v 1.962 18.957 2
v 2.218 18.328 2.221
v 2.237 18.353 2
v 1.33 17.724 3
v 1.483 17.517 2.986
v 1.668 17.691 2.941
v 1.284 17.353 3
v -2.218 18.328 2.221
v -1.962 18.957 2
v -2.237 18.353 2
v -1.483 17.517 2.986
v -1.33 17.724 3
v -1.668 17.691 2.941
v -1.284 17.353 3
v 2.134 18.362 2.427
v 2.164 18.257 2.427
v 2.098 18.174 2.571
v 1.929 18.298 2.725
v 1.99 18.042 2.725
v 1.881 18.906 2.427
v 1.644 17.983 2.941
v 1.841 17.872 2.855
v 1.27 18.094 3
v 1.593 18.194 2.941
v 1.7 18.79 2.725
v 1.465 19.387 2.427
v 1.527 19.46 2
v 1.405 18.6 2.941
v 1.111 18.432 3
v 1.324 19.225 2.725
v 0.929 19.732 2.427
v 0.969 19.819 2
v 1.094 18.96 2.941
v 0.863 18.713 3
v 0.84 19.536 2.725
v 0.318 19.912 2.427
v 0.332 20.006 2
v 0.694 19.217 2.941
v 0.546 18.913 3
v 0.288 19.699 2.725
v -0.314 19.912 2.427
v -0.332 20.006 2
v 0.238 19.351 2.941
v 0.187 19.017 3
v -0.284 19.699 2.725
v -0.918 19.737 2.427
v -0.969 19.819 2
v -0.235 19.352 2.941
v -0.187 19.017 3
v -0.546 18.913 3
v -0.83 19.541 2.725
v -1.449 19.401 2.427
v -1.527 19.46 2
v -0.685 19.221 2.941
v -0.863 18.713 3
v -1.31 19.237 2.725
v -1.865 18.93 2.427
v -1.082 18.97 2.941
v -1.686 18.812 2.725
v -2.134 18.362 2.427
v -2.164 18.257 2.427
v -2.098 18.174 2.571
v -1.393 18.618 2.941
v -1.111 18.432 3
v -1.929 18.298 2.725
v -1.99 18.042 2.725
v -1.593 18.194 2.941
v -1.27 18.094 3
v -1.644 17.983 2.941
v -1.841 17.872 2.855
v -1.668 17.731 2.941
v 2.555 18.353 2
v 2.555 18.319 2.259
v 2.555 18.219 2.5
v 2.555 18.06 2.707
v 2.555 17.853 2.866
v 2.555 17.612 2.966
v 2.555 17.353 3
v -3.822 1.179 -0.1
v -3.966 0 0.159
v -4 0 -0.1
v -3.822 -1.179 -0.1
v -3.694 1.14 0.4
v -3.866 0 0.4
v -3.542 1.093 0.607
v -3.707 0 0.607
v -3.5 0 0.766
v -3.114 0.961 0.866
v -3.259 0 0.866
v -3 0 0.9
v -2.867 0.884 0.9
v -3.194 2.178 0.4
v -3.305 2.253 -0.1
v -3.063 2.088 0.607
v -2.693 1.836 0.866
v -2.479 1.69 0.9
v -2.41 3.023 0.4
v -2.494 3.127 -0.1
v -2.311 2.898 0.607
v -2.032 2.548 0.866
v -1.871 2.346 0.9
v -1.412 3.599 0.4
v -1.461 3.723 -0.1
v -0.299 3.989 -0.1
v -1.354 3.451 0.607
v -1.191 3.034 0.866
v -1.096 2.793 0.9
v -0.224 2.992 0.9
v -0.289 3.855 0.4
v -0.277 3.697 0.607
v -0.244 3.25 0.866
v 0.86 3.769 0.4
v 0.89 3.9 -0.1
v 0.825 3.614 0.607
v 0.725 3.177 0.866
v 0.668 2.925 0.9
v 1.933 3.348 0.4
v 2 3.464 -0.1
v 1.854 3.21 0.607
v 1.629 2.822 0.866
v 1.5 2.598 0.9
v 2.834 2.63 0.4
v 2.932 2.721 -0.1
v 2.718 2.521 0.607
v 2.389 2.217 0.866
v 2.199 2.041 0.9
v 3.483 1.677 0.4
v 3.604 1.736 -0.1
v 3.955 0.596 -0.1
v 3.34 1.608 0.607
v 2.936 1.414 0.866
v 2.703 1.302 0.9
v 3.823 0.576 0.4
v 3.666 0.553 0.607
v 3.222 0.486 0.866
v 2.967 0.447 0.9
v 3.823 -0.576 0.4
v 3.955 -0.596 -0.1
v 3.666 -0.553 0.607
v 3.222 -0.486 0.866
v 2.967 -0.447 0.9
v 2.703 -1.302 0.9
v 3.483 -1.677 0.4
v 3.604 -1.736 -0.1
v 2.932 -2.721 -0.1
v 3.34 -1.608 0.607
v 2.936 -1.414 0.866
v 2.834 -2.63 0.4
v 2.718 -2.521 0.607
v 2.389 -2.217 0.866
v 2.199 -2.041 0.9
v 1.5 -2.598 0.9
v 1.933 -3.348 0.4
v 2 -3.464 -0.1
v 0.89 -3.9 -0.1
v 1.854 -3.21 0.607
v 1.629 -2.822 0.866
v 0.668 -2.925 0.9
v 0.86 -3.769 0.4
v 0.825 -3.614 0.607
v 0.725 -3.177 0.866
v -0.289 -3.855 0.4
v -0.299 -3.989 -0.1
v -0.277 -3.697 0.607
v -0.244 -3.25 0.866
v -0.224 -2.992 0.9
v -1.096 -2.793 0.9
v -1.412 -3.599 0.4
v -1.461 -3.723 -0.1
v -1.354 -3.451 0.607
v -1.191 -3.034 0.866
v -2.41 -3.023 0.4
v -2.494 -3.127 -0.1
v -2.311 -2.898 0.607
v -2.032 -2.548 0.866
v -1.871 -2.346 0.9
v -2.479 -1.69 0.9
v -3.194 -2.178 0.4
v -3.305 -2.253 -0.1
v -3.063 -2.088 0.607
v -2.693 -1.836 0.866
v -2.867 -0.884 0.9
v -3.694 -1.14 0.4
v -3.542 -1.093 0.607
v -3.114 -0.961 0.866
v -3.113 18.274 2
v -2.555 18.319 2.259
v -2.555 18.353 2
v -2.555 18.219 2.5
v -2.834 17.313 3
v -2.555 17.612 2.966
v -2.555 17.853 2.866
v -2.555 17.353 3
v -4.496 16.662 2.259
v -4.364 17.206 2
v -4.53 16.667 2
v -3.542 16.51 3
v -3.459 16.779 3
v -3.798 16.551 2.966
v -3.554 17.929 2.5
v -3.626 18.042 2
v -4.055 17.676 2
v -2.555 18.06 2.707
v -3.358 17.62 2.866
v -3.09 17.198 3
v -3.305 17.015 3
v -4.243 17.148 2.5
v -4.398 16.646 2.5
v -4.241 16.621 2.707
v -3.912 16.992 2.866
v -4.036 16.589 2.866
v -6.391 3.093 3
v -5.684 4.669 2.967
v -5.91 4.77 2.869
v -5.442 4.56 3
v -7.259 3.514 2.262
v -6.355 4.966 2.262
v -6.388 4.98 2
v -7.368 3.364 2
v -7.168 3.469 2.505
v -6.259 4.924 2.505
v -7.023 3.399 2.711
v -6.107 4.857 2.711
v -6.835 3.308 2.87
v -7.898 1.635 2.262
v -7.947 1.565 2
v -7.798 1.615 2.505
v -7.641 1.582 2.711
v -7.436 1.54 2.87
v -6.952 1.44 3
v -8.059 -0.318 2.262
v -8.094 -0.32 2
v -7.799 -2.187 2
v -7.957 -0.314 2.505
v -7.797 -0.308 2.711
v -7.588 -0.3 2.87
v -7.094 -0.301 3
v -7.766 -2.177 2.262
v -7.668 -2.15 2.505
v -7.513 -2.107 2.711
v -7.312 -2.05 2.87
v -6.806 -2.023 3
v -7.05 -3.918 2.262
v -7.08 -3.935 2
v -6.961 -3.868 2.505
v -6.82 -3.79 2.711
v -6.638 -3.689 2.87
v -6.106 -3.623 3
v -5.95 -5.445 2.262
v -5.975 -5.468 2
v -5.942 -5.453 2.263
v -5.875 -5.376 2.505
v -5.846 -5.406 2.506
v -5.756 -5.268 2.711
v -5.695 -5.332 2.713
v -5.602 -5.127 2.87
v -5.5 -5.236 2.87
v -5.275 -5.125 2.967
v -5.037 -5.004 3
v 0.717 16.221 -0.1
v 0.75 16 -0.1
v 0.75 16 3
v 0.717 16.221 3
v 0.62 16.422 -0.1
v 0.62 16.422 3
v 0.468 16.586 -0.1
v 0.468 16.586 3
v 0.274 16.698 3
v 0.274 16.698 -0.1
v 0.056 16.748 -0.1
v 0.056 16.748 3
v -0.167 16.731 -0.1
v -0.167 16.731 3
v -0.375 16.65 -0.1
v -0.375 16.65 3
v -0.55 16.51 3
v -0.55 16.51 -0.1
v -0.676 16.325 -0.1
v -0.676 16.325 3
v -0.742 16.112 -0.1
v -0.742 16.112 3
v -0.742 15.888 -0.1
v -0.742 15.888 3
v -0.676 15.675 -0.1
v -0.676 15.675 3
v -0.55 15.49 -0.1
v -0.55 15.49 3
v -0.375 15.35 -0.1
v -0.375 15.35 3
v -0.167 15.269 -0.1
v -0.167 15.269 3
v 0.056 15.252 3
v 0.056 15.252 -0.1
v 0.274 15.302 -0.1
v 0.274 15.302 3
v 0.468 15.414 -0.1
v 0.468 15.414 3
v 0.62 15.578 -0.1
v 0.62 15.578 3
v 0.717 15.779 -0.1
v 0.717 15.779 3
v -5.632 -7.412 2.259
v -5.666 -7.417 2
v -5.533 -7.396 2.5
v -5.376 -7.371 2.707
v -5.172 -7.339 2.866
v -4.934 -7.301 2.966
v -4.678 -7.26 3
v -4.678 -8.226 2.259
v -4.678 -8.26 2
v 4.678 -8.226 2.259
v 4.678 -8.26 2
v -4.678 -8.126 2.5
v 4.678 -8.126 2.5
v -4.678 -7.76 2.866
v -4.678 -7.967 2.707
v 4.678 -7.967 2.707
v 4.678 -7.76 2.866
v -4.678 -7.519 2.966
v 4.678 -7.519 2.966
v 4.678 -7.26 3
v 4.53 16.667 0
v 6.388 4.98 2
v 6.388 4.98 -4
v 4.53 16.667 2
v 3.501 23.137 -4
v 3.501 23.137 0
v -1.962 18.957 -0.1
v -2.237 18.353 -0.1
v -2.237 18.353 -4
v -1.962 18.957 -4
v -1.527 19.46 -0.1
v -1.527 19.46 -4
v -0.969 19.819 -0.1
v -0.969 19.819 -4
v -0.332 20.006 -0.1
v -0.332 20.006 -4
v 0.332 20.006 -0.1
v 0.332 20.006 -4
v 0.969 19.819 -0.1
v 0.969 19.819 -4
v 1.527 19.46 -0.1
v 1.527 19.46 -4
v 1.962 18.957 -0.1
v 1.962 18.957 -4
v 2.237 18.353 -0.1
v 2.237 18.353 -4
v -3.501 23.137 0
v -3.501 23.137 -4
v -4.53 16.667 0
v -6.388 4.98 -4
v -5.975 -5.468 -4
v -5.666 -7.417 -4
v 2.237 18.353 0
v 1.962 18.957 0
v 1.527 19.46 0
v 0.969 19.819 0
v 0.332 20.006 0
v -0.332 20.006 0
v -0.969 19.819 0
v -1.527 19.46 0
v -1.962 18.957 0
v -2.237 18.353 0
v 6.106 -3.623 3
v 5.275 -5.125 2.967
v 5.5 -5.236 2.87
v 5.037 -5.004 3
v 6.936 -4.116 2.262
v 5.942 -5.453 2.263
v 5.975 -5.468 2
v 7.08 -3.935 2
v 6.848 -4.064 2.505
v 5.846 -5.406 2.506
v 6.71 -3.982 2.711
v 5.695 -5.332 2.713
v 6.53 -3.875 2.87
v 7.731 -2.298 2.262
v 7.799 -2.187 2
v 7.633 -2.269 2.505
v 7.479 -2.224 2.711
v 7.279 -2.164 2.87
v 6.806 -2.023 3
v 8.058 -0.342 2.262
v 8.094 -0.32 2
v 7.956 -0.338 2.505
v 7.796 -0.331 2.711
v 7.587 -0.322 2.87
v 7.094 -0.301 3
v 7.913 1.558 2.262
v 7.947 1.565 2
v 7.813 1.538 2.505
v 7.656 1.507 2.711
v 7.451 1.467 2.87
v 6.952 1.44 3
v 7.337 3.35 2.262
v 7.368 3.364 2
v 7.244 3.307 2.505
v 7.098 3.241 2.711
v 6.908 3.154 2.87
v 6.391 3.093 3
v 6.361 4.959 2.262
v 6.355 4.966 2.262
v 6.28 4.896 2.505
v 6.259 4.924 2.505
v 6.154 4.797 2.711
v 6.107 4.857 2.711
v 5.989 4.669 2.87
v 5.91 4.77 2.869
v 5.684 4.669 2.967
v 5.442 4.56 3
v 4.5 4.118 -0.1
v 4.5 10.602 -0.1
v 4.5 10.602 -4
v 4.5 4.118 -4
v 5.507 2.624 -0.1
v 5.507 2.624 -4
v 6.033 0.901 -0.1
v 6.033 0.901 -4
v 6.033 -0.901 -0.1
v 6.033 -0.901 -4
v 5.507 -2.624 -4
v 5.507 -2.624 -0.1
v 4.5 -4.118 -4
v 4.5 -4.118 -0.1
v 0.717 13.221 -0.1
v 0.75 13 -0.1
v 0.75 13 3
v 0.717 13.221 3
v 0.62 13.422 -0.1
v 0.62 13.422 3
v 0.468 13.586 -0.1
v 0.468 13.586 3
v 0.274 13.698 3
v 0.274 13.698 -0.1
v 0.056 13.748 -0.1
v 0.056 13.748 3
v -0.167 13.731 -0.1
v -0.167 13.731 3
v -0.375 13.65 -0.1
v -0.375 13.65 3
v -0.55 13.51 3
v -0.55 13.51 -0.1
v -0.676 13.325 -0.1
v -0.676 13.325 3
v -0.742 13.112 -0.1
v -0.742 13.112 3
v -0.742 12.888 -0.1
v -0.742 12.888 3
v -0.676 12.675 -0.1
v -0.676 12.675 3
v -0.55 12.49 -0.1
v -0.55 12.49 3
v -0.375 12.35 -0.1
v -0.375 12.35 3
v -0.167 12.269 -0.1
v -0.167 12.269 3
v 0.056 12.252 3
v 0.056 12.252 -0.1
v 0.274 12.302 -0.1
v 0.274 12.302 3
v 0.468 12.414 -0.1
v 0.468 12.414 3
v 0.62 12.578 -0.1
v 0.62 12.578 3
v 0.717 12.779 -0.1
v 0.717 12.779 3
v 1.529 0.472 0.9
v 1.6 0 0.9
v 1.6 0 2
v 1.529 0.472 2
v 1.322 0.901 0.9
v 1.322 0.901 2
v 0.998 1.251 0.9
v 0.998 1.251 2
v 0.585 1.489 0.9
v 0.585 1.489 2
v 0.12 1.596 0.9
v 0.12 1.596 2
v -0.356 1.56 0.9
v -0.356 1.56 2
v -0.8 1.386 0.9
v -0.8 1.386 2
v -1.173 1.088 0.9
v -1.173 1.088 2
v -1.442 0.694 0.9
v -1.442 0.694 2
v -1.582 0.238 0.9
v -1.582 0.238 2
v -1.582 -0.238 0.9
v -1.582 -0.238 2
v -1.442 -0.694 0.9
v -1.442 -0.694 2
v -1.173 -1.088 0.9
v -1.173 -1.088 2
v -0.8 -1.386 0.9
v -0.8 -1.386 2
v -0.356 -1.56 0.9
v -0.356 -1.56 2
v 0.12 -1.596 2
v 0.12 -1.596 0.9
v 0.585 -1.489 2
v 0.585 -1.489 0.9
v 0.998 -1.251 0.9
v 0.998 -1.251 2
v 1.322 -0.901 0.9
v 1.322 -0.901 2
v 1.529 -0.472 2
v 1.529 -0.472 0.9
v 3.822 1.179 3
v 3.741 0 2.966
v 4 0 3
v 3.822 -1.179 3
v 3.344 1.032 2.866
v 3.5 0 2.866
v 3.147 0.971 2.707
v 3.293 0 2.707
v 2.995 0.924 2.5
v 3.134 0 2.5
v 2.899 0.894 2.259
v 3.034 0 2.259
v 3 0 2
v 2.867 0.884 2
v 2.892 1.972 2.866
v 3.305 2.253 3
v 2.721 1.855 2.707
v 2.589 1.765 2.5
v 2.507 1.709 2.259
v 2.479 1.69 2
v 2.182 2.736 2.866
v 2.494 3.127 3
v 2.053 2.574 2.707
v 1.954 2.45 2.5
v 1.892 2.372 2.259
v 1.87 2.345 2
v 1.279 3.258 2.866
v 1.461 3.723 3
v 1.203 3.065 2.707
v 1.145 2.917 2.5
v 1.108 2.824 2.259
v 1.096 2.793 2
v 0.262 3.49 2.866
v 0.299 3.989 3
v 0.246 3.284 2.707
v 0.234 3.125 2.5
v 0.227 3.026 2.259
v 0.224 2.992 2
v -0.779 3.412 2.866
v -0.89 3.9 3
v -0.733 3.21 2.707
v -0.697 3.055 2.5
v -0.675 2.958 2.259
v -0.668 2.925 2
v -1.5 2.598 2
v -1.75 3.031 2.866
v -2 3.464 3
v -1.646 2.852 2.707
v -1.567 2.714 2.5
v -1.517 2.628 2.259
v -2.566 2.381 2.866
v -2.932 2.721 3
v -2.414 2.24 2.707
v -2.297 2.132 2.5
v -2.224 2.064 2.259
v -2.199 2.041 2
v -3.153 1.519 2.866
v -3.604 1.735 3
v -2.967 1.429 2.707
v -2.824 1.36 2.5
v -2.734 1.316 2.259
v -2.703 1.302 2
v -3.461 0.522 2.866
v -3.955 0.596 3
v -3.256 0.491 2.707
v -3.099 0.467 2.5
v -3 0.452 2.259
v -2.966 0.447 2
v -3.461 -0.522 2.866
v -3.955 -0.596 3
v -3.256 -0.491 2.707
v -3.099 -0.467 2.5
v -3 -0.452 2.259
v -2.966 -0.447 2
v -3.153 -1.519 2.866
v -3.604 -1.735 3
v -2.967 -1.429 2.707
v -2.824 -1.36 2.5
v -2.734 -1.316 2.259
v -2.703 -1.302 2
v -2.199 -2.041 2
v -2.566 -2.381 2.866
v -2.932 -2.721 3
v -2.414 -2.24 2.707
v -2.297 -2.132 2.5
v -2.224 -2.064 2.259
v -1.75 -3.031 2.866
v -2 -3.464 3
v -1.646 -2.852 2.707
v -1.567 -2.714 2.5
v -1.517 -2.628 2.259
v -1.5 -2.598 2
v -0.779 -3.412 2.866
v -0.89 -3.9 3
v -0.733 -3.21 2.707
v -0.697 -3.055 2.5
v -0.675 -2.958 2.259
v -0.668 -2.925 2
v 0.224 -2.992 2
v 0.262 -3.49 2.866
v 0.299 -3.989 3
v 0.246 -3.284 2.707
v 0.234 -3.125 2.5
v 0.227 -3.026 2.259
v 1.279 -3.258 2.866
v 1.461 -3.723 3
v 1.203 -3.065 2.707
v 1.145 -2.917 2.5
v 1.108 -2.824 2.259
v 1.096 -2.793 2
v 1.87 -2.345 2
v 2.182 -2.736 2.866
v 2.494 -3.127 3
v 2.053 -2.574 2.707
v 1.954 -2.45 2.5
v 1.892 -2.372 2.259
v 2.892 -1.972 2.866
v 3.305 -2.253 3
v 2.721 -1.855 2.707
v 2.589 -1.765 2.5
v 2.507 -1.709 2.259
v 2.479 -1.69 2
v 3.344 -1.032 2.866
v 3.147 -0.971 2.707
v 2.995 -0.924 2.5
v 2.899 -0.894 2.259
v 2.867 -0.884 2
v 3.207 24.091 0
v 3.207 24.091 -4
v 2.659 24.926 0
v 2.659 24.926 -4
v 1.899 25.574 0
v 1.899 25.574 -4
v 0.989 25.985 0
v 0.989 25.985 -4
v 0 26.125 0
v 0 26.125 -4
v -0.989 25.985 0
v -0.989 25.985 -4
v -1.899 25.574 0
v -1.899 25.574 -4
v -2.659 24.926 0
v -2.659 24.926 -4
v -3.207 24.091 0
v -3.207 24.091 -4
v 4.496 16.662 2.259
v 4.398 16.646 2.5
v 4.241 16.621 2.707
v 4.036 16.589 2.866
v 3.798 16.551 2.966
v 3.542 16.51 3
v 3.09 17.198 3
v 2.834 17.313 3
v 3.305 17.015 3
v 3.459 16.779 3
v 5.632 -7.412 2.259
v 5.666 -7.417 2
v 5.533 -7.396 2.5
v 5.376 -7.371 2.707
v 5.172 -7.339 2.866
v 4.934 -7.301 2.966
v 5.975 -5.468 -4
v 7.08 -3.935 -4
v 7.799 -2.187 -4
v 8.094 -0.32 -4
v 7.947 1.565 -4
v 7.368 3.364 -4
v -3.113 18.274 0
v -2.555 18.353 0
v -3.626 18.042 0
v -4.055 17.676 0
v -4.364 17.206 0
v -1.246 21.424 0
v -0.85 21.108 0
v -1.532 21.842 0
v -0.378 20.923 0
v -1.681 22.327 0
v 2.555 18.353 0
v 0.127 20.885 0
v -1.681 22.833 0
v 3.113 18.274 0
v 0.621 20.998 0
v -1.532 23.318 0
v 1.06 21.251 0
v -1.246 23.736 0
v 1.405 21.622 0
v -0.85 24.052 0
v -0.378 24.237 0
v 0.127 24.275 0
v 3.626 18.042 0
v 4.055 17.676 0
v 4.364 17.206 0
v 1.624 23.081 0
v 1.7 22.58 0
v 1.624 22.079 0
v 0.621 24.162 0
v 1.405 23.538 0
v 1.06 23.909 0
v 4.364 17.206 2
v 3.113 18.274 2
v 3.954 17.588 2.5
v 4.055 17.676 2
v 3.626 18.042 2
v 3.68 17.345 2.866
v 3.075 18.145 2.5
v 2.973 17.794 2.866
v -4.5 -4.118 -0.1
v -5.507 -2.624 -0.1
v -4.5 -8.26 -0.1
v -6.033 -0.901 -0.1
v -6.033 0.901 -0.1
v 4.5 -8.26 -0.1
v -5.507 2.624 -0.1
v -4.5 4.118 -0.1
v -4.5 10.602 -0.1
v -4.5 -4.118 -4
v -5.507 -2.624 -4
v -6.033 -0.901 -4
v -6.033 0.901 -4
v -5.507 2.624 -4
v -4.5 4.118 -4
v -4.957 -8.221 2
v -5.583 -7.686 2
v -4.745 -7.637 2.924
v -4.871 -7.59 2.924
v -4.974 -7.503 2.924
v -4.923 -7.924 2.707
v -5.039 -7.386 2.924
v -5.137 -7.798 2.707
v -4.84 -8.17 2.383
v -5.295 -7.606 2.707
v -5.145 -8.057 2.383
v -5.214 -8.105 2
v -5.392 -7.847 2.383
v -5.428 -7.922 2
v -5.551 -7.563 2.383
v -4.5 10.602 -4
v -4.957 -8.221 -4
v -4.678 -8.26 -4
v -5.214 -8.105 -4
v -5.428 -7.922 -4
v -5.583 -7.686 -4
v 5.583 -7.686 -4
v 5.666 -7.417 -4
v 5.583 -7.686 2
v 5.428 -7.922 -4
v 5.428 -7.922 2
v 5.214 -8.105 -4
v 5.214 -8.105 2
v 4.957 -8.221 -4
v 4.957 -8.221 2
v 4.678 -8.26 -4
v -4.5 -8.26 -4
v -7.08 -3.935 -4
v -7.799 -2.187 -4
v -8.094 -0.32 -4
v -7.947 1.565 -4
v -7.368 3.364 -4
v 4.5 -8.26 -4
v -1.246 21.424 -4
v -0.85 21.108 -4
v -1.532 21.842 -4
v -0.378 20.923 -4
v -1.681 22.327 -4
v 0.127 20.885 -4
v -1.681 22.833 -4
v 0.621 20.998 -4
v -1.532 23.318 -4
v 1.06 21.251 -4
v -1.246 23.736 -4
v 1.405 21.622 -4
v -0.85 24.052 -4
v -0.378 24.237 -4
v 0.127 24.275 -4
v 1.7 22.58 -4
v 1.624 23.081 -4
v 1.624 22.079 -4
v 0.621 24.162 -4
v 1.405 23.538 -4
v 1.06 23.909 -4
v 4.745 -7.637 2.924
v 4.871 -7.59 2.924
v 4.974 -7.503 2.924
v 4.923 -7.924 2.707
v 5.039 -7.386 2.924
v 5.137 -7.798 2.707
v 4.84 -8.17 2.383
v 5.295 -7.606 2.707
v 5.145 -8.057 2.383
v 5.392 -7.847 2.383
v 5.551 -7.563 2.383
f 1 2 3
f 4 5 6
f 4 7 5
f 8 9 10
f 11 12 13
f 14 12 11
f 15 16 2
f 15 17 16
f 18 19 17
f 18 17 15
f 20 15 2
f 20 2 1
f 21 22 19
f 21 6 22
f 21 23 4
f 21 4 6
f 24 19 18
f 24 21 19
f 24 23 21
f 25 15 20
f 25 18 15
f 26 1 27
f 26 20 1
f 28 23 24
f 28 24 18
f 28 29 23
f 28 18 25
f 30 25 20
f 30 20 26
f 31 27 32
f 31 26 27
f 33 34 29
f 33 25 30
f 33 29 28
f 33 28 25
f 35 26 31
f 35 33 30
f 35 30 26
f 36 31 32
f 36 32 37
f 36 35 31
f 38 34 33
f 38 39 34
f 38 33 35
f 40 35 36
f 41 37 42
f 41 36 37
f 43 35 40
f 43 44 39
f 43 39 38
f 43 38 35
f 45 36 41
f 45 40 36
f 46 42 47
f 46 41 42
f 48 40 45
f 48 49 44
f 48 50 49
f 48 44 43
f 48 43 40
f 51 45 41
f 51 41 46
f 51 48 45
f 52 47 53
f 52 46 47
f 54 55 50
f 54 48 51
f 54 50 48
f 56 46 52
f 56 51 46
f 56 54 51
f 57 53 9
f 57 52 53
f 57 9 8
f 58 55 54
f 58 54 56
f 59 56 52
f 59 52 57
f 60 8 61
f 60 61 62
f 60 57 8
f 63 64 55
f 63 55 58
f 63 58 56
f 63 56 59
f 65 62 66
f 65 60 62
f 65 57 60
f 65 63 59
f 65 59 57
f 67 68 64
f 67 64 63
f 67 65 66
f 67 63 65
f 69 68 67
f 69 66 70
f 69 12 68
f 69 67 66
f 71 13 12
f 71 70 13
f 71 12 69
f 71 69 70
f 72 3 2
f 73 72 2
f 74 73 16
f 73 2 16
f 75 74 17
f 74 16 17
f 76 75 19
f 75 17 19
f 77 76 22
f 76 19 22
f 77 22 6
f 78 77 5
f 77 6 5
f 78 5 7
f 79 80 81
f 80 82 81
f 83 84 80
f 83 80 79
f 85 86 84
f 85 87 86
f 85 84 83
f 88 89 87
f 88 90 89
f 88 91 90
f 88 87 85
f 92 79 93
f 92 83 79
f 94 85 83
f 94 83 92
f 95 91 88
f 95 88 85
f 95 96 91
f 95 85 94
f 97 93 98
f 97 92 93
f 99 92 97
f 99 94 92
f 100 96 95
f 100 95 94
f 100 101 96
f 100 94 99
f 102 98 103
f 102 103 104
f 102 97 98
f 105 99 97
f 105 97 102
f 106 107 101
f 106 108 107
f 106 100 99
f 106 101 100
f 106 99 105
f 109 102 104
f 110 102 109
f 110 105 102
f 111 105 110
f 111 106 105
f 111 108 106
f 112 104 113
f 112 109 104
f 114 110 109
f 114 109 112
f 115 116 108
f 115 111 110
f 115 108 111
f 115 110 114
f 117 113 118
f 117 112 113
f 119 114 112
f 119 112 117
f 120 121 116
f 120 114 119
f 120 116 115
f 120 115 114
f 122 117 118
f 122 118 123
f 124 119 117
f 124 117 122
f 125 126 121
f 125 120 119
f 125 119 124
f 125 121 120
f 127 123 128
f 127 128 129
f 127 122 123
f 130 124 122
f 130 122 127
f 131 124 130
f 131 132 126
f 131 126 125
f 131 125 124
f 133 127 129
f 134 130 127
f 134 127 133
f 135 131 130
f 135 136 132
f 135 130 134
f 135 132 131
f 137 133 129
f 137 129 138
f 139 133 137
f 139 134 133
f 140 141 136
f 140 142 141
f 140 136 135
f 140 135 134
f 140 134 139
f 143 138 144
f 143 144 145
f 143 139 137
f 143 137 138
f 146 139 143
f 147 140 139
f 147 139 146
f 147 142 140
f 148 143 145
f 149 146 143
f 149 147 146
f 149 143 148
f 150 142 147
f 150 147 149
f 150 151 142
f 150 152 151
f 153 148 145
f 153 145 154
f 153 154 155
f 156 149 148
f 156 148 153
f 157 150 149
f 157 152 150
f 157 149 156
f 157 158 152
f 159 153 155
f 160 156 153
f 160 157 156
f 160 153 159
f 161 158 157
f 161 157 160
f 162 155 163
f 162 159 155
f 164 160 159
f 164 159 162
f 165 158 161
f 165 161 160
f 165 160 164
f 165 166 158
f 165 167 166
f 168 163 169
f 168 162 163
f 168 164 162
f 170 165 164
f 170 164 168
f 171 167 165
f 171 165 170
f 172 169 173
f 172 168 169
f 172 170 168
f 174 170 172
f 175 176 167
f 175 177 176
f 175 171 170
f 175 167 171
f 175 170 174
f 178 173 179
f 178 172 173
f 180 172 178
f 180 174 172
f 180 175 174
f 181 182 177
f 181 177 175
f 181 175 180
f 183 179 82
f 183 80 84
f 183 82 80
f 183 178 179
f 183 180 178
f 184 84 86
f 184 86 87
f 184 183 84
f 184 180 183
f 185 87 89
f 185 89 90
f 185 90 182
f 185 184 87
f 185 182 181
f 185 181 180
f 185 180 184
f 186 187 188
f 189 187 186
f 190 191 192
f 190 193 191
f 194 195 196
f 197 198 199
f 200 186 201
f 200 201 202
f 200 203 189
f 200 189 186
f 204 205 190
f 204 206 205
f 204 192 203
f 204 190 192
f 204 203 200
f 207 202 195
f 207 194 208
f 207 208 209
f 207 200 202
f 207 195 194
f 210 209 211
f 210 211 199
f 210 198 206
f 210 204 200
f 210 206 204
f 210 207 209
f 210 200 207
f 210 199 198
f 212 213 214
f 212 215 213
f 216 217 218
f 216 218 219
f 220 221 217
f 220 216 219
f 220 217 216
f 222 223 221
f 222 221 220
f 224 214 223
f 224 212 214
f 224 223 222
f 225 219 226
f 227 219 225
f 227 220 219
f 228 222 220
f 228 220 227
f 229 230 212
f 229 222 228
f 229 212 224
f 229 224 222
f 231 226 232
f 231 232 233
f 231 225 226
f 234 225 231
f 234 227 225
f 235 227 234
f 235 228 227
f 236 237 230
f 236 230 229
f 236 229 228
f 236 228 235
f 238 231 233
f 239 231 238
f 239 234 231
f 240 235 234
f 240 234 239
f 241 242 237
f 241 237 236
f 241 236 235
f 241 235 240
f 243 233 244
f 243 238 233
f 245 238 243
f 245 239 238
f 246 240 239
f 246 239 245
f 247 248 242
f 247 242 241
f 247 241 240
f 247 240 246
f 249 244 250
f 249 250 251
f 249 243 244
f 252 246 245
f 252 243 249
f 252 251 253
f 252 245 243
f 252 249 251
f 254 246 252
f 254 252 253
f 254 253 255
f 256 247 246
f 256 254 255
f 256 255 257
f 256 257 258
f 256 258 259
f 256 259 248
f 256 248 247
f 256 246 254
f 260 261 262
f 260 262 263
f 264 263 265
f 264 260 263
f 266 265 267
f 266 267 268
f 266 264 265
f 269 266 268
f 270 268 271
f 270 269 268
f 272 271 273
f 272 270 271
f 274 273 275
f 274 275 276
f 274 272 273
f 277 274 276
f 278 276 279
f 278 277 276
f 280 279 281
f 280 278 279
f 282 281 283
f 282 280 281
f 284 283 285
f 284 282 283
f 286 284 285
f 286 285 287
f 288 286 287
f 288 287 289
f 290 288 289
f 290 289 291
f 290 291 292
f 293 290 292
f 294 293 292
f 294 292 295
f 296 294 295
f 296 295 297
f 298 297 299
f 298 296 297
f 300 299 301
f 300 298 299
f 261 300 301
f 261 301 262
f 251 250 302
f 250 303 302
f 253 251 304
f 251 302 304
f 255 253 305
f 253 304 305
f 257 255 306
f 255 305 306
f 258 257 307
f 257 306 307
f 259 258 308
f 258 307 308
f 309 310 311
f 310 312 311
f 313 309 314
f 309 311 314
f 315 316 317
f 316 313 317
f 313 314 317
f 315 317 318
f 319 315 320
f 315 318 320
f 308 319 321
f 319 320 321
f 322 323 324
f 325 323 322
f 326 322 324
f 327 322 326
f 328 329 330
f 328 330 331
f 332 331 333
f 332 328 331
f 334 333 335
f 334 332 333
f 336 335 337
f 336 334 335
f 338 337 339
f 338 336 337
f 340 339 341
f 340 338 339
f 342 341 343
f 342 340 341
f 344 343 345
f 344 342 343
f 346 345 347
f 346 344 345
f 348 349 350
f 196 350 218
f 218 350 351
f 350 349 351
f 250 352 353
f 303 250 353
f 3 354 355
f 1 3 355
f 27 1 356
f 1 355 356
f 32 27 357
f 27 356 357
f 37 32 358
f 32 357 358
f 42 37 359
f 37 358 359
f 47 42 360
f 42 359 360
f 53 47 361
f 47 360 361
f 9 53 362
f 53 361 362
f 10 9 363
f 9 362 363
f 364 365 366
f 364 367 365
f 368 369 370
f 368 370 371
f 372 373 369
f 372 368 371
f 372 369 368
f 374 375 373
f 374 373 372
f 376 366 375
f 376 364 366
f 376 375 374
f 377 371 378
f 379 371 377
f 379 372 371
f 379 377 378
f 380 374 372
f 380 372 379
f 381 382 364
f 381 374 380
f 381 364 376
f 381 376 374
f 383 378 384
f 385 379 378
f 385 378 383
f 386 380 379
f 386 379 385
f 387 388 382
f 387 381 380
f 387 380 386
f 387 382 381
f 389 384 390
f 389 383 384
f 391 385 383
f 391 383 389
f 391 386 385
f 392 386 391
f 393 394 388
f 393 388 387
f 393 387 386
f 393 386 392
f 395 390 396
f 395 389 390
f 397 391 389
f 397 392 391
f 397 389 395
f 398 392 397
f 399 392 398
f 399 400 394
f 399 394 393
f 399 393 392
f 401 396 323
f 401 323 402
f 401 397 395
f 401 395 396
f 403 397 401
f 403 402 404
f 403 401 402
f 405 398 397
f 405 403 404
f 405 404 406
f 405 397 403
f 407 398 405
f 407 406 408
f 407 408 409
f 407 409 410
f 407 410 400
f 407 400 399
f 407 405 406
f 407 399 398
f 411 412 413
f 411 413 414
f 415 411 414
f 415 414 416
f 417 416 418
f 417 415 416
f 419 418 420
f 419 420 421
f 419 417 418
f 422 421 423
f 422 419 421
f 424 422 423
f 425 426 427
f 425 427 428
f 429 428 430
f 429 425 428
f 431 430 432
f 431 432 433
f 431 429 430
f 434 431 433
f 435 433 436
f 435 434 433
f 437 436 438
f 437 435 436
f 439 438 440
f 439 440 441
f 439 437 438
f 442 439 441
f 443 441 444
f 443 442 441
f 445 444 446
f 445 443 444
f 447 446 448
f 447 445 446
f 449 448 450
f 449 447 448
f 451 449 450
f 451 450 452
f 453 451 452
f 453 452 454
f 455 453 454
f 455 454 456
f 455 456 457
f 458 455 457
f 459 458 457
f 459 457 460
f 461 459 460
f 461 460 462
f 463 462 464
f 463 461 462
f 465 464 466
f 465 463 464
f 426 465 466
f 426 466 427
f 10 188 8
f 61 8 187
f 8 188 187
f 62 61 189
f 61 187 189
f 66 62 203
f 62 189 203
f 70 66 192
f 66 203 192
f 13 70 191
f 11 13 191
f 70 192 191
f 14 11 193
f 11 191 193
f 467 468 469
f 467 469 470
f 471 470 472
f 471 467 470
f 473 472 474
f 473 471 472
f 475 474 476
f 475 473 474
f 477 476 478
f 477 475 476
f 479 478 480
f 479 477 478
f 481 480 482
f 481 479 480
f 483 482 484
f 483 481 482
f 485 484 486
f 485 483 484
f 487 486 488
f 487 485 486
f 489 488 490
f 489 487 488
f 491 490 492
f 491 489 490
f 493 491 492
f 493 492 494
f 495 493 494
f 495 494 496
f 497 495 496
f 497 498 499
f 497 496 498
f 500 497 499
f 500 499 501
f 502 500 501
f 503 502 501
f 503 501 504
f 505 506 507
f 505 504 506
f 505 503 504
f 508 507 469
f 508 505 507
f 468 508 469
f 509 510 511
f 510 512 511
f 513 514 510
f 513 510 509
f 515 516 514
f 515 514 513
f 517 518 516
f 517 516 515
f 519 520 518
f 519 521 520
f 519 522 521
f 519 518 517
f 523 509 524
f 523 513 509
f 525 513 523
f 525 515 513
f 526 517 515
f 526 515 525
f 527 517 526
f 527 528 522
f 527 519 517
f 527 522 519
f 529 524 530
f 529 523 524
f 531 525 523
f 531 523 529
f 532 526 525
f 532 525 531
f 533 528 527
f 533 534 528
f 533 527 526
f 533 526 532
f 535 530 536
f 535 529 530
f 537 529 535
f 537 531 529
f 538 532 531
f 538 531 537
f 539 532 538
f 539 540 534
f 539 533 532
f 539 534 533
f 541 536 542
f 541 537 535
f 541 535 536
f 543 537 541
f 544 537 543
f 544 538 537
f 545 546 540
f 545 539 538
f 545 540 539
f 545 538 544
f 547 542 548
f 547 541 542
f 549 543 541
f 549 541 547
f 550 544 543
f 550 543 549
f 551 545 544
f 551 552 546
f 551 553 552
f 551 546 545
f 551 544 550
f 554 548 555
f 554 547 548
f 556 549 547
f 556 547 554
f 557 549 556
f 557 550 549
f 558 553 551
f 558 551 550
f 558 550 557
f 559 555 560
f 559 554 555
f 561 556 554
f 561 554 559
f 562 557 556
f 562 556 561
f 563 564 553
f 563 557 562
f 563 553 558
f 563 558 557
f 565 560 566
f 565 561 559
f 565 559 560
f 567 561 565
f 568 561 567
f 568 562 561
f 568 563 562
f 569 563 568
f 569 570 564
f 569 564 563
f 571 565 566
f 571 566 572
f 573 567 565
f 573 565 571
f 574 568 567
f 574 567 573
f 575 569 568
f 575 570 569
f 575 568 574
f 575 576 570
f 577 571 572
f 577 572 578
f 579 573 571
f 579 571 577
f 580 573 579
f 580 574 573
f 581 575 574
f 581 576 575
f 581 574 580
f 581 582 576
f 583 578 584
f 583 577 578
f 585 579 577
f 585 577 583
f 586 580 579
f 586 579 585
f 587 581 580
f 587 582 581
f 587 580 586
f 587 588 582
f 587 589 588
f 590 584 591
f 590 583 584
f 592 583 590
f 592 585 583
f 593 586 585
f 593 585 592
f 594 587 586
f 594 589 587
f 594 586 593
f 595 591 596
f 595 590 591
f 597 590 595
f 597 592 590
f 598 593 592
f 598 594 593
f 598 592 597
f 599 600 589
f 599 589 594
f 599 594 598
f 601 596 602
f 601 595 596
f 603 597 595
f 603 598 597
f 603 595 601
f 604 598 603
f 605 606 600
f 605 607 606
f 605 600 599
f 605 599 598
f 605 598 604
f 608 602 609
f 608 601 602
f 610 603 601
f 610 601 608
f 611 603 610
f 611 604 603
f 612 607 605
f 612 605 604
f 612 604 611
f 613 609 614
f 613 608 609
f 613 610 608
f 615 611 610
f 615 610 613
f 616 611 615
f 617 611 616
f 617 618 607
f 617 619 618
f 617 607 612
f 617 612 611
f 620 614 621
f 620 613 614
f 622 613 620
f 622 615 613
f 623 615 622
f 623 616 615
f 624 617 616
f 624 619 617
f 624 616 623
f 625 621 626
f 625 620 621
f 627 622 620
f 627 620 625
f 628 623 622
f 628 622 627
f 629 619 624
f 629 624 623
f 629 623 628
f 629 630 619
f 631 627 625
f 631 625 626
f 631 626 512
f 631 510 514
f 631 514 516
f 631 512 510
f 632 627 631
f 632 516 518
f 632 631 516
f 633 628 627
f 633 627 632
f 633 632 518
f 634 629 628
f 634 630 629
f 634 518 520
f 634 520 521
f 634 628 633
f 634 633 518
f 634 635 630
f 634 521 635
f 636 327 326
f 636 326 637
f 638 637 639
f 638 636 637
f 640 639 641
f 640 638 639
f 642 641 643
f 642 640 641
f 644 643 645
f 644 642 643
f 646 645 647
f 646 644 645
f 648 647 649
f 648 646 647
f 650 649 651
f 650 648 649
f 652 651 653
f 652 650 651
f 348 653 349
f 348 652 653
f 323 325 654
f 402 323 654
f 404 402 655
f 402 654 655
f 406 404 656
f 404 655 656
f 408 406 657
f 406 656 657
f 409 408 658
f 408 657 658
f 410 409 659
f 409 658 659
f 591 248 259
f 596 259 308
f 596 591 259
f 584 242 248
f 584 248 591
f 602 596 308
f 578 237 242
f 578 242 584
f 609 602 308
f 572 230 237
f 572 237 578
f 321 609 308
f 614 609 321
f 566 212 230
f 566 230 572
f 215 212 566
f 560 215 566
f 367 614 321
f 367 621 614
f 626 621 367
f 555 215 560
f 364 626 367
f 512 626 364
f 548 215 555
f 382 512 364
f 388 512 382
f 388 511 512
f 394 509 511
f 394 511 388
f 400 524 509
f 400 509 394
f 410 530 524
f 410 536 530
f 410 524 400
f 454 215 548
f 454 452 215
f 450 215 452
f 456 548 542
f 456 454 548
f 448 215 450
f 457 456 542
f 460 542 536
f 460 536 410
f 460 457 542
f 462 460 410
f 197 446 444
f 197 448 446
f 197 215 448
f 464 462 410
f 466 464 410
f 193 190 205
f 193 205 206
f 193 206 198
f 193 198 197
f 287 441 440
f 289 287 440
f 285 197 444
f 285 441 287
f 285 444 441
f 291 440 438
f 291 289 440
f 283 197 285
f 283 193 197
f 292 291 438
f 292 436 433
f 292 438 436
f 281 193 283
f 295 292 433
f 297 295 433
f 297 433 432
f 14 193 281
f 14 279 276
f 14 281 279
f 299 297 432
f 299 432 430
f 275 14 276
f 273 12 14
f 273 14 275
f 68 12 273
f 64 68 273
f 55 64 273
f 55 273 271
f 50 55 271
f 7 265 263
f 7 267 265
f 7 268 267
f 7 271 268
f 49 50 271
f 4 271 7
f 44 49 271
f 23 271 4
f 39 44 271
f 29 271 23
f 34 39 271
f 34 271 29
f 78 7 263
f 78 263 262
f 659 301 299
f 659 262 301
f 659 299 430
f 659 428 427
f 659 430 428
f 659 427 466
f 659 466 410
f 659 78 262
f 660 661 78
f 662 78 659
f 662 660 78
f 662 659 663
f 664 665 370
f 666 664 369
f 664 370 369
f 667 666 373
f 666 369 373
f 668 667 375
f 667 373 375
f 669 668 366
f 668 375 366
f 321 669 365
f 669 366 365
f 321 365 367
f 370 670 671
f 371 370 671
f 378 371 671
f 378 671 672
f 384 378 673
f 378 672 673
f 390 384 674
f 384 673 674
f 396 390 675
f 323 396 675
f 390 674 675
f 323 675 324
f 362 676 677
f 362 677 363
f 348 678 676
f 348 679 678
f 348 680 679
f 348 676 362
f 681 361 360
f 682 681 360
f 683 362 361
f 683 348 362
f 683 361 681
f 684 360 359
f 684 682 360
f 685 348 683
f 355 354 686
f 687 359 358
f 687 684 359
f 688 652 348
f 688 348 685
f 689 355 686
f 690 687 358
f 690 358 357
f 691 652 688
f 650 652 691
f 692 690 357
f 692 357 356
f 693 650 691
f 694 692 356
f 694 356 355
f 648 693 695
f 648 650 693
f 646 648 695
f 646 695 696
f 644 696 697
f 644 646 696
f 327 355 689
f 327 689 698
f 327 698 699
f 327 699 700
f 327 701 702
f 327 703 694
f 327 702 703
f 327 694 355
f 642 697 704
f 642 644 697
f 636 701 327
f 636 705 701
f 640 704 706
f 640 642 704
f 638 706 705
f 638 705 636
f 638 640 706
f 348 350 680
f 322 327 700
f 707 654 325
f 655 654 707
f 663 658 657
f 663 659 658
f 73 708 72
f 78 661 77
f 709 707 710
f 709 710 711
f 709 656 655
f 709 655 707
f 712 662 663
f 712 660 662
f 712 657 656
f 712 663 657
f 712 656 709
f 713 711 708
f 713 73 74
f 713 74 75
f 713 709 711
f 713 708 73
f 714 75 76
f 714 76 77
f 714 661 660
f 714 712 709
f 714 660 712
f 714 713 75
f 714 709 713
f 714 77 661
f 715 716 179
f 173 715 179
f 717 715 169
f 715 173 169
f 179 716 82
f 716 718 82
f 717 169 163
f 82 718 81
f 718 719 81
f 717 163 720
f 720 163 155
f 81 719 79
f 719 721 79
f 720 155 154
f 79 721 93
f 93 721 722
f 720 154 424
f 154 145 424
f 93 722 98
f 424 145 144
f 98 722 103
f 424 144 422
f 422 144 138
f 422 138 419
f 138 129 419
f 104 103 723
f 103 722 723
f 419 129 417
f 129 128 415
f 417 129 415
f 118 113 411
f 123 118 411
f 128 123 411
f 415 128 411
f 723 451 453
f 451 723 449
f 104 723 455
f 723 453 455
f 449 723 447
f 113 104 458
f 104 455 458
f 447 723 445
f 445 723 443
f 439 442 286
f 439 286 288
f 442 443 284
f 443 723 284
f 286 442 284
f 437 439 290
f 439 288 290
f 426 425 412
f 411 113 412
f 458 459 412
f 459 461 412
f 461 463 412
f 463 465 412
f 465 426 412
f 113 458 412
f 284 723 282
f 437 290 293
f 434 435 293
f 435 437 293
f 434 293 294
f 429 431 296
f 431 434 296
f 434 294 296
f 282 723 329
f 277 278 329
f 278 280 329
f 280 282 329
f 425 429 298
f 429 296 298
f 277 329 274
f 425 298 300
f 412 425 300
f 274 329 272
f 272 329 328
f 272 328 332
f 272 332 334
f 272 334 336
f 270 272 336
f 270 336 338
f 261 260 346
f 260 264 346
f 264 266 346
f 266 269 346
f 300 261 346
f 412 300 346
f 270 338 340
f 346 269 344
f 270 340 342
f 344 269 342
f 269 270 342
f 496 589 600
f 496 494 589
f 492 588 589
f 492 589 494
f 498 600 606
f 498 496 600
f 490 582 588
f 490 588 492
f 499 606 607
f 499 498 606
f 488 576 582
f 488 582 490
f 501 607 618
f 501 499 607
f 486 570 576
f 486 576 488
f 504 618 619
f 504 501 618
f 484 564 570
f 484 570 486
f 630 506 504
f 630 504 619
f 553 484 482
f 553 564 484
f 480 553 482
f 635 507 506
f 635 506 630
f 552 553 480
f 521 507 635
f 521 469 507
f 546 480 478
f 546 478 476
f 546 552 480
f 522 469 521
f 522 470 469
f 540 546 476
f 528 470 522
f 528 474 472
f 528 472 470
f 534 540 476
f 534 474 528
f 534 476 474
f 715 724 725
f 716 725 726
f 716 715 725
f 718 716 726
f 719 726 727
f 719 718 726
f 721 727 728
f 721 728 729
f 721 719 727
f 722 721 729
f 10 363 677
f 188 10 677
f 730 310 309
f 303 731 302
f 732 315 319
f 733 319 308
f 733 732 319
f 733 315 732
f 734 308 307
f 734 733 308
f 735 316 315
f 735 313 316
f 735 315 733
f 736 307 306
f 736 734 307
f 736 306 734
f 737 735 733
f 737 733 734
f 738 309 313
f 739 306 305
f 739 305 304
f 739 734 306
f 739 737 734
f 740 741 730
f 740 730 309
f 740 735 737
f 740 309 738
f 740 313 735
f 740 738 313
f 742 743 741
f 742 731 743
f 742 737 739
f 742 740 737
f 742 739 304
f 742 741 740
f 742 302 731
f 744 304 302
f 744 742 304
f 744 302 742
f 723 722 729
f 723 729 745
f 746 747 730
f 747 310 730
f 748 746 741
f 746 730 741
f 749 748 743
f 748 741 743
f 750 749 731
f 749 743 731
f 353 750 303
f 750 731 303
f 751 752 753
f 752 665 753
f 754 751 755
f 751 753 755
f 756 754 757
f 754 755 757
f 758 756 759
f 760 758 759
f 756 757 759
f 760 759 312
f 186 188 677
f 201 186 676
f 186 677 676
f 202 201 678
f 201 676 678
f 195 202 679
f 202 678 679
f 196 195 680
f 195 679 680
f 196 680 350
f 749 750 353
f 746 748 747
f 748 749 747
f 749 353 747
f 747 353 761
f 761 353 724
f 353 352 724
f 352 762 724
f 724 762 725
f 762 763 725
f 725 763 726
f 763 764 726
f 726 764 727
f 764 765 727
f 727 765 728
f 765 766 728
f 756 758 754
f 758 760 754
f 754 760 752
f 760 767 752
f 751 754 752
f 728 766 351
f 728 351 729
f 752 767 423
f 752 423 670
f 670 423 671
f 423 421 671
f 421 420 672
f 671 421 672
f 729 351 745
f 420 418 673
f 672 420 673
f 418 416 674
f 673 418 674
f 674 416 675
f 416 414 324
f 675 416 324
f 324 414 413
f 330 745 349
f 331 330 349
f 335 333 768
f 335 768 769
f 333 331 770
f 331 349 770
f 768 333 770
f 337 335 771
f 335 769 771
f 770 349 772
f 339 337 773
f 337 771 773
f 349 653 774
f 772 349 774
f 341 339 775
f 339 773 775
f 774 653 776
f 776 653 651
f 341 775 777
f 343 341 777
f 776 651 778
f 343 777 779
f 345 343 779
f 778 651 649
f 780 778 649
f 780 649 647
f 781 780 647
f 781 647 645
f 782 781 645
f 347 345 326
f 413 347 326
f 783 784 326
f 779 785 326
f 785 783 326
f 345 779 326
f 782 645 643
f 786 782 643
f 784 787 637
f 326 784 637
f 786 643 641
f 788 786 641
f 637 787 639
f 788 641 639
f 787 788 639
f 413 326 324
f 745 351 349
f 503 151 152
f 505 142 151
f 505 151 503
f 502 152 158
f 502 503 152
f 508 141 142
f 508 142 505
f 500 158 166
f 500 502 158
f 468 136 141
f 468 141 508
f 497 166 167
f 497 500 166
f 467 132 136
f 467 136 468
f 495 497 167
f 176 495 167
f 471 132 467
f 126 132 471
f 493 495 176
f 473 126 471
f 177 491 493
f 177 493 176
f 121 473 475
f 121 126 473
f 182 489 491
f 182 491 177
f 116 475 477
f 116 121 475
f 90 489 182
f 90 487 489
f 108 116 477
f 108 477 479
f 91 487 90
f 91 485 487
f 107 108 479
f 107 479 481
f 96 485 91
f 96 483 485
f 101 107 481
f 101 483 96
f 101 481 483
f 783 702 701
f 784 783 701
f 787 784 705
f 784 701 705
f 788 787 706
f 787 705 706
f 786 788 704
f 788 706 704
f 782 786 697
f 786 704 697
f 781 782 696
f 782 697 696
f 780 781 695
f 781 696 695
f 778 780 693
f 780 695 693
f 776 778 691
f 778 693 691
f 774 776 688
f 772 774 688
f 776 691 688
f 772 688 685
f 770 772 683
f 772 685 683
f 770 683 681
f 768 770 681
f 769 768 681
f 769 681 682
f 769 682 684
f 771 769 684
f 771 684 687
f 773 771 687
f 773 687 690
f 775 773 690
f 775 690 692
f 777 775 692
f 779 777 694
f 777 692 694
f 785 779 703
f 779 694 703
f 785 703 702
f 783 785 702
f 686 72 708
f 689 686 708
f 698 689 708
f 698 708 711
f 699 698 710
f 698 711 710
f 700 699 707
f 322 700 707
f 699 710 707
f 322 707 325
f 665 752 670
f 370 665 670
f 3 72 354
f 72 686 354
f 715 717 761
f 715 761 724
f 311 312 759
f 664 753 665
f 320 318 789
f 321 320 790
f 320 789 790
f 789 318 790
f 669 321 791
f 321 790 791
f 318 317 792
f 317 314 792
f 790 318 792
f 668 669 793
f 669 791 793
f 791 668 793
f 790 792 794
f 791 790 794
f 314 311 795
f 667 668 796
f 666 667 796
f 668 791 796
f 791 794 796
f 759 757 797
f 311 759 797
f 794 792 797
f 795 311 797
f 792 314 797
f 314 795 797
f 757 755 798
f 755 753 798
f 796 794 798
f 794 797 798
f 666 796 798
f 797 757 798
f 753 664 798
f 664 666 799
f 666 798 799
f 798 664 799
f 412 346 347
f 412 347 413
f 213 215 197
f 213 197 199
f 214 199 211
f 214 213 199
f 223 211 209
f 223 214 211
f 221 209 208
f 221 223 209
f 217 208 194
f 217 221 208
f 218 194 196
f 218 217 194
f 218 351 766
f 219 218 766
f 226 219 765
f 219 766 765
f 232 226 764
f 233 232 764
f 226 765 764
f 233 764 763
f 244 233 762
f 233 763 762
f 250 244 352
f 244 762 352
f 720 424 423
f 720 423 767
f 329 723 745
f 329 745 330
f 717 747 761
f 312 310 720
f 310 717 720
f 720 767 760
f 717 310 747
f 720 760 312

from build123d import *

# Parameters (mm, degrees)
SKETCH1_R                = 1.7
BOSS_EXTRUDE4_DEPTH      = 4
BOSS_EXTRUDE6_DEPTH      = 3
BOSS_EXTRUDE6_DEPTH_BACK = 0.1
SKETCH1_9_R              = 0.749999999999988
SKETCH1_9_R_2            = 0.749999999999991
SKETCH1_9_R_3            = 1.6
FILLET2_R                = 1
FILLET3_R                = 2
SKETCH2_R                = 4
CUT_EXTRUDE1_DEPTH       = 1
SKETCH3_R                = 3.0000000000000004
CUT_EXTRUDE2_DEPTH       = 1
FILLET4_R                = 1
FILLET5_R                = 1


# Some blends are built 0.0001 mm under size
with BuildPart() as part:
    # Sketch1 → Boss-Extrude4 (new body)
    with BuildSketch(Plane.XY):
        with BuildLine():
            Line((-3.5013415582545715, 23.136685369325342), (-6.388076465833109, 4.9802087372588275))
            ThreePointArc((-6.388076465833109, 4.9802087372588275), (-8.093690123038968, -0.31965636583910695), (-5.975409836065571, -5.468498632261951))
            Line((-5.9754098360655705, -5.468498632261951), (-5.531546482610164, -8.2602321522629))
            Line((-5.531546482610164, -8.2602321522629), (-4.5, -8.2602321522629))
            Line((-4.499999999999999, -8.2602321522629), (-4.500000000000003, -4.1182520563948))
            ThreePointArc((-4.500000000000003, -4.1182520563948), (-6.1, -6.7e-16), (-4.500000000000001, 4.118252056394799))
            Line((-4.5, 4.118252056394798), (-4.500000000000003, 10.602053391322137))
            Line((-4.500000000000003, 10.602053391322137), (-2.23677055895614, 18.353113855252126))
            ThreePointArc((-2.236770558956141, 18.353113855252126), (5.33e-15, 20.030171719280638), (2.2367705589561506, 18.353113855252126))
            Line((2.2367705589561497, 18.353113855252126), (4.499999999999999, 10.602053391322137))
            Line((4.499999999999999, 10.602053391322137), (4.500000000000003, 4.1182520563948))
            ThreePointArc((4.5000000000000036, 4.1182520563948), (6.099999999999998, -2.2e-16), (4.5, -4.118252056394798))
            Line((4.5, -4.118252056394798), (4.500000000000001, -8.260232152262898))
            Line((4.500000000000001, -8.2602321522629), (5.531546482610164, -8.2602321522629))
            Line((5.531546482610164, -8.2602321522629), (5.975409836065575, -5.468498632261945))
            ThreePointArc((5.975409836065576, -5.468498632261946), (8.093690123038972, -0.3196563658391036), (6.388076465833111, 4.9802087372588275))
            Line((6.388076465833109, 4.9802087372588275), (3.5013415582545715, 23.136685369325342))
            ThreePointArc((3.5013415582545715, 23.136685369325342), (-1.1e-16, 26.125319634106553), (-3.5013415582545715, 23.136685369325342))
        make_face()
        with Locations((0, 22.58)):
            Circle(SKETCH1_R, mode=Mode.SUBTRACT)
    extrude(amount=-BOSS_EXTRUDE4_DEPTH)

    # Sketch1<9> → Boss-Extrude6 (add, two sides: drawn at the far end of the back side and taken through both)
    with BuildSketch(Plane.XY.offset(-BOSS_EXTRUDE6_DEPTH_BACK)):
        with BuildLine():
            Line((-2.2367705589561404, 18.353113855252126), (-4.261891259190779, 18.353113855252126))
            Line((-4.261891259190779, 18.353113855252126), (-6.388076465833109, 4.9802087372588275))
            ThreePointArc((-6.388076465833109, 4.9802087372588275), (-8.093690123038968, -0.31965636583910695), (-5.975409836065571, -5.468498632261951))
            Line((-5.9754098360655705, -5.468498632261951), (-5.531546482610164, -8.2602321522629))
            Line((-5.531546482610164, -8.2602321522629), (5.531546482610164, -8.2602321522629))
            Line((5.531546482610164, -8.2602321522629), (5.975409836065575, -5.468498632261945))
            ThreePointArc((5.975409836065576, -5.468498632261946), (8.093690123038972, -0.3196563658391036), (6.388076465833111, 4.9802087372588275))
            Line((6.388076465833109, 4.9802087372588275), (4.261891259190779, 18.353113855252126))
            Line((4.261891259190779, 18.353113855252126), (2.2367705589561506, 18.353113855252126))
            ThreePointArc((2.2367705589561506, 18.353113855252126), (5.33e-15, 20.030171719280638), (-2.236770558956141, 18.353113855252126))
        make_face()
        with Locations((5.15e-15, 16)):
            Circle(SKETCH1_9_R, mode=Mode.SUBTRACT)
        with Locations((4.18e-15, 13.000000000000002)):
            Circle(SKETCH1_9_R_2, mode=Mode.SUBTRACT)
        Circle(SKETCH1_9_R_3, mode=Mode.SUBTRACT)
    extrude(amount=BOSS_EXTRUDE6_DEPTH + BOSS_EXTRUDE6_DEPTH_BACK)

    # Fillet2
    fillet2_edges = [part.edges().sort_by_distance(p)[0] for p in [
        (5.531546482610164, -8.2602321522629, -0.5),
        (-5.531546482610164, -8.2602321522629, -0.5),
        (0, -8.2602321522629, 3),
        (5.753478159337869, -6.864365392262423, 3),
        (-8.093690123038968, -0.3196563658391076, 3),
        (-5.324983862511944, 11.666661296255477, 3),
        (-3.2493309090734597, 18.353113855252126, 3),
        (3.249330909073465, 18.353113855252126, 3),
        (5e-15, 20.030171719280638, 3),
        (-5.753478159337868, -6.864365392262425, 3),
        (8.093690123038972, -0.31965636583910384, 3),
        (5.324983862511944, 11.666661296255477, 3),
    ]]
    fillet(fillet2_edges, radius=FILLET2_R)

    # Fillet3
    # the kernel refuses this fillet: 2 mm, written as the material it takes off along each edge
    with BuildSketch(Plane(origin=(-2.554754600251938, 16.35311385525213, 3), x_dir=(0, 1, 0), z_dir=(1, 0, 0))) as fillet3_piece_1:
        with BuildLine():
            CenterArc((1, -1), 1, 0, 90)
            Line((2, -1), (2, 0))
            Line((2, 0), (1, 0))
        make_face()
    revolve(axis=Axis((-2.554754600251938, 16.35311385525213, 3), (0, 0, 1)), revolution_arc=80.96604330855703, mode=Mode.SUBTRACT)
    with BuildSketch(Plane(origin=(2.554754600251939, 16.35311385525213, 3), x_dir=(0.9875954553070736, 0.15701979702194924, 0), z_dir=(0.15701979702194924, -0.9875954553070736, 0))) as fillet3_piece_2:
        with BuildLine():
            CenterArc((1, -1), 1, 0, 90)
            Line((2, -1), (2, 0))
            Line((2, 0), (1, 0))
        make_face()
    revolve(axis=Axis((2.554754600251939, 16.35311385525213, 3), (0, 0, 1)), revolution_arc=80.96604330855705, mode=Mode.SUBTRACT)
    with BuildSketch(Plane(origin=(4.261891259190781, 18.353113855252126, 3), x_dir=(0.15701979702194913, -0.9875954553070736, 0), z_dir=(0, 0, -1))) as fillet3_piece_3:
        with BuildLine():
            CenterArc((FILLET3_R * 0.853568329469, FILLET3_R), FILLET3_R, 189.03395669144297, 80.96604330855706)
            Line((-FILLET3_R * 0.134027125838, FILLET3_R * 0.842980202978), (0, 0))
            Line((0, 0), (FILLET3_R * 0.853568329469, -3e-17))
        make_face()
    extrude(amount=3, mode=Mode.SUBTRACT)
    with BuildSketch(Plane(origin=(-4.261891259190779, 18.353113855252126, 0), x_dir=(-0.15701979702194965, -0.9875954553070736, 0), z_dir=(0, 0, 1))) as fillet3_piece_4:
        with BuildLine():
            CenterArc((FILLET3_R * 0.853568329469, FILLET3_R), FILLET3_R, 189.033956691443, 80.96604330855706)
            Line((-FILLET3_R * 0.134027125838, FILLET3_R * 0.842980202978), (0, 0))
            Line((0, 0), (FILLET3_R * 0.853568329469, -3e-17))
        make_face()
    extrude(amount=3.000000000000001, mode=Mode.SUBTRACT)

    # Sketch2 → Cut-Extrude1 (cut)
    with BuildSketch(Plane(origin=(0, 0, -0.1), x_dir=(-1, 0, 0), z_dir=(0, 0, -1))):
        Circle(SKETCH2_R)
    extrude(amount=-CUT_EXTRUDE1_DEPTH, mode=Mode.SUBTRACT)

    # Sketch3 → Cut-Extrude2 (cut)
    with BuildSketch(Plane.XY.offset(3)):
        Circle(SKETCH3_R)
    extrude(amount=-CUT_EXTRUDE2_DEPTH, mode=Mode.SUBTRACT)

    # Fillet4
    fillet4_edges = [part.edges().sort_by_distance(p)[0] for p in [
        (4, 4.9e-16, 0.9),
    ]]
    fillet(fillet4_edges, radius=FILLET4_R - 0.0001)  # a hair under: the kernel refuses the full size

    # Fillet5
    fillet5_edges = [part.edges().sort_by_distance(p)[0] for p in [
        (-3.0000000000000004, 3.7e-16, 3),
    ]]
    fillet(fillet5_edges, radius=FILLET5_R - 0.0001)  # a hair under: the kernel refuses the full size


solid = part.part
